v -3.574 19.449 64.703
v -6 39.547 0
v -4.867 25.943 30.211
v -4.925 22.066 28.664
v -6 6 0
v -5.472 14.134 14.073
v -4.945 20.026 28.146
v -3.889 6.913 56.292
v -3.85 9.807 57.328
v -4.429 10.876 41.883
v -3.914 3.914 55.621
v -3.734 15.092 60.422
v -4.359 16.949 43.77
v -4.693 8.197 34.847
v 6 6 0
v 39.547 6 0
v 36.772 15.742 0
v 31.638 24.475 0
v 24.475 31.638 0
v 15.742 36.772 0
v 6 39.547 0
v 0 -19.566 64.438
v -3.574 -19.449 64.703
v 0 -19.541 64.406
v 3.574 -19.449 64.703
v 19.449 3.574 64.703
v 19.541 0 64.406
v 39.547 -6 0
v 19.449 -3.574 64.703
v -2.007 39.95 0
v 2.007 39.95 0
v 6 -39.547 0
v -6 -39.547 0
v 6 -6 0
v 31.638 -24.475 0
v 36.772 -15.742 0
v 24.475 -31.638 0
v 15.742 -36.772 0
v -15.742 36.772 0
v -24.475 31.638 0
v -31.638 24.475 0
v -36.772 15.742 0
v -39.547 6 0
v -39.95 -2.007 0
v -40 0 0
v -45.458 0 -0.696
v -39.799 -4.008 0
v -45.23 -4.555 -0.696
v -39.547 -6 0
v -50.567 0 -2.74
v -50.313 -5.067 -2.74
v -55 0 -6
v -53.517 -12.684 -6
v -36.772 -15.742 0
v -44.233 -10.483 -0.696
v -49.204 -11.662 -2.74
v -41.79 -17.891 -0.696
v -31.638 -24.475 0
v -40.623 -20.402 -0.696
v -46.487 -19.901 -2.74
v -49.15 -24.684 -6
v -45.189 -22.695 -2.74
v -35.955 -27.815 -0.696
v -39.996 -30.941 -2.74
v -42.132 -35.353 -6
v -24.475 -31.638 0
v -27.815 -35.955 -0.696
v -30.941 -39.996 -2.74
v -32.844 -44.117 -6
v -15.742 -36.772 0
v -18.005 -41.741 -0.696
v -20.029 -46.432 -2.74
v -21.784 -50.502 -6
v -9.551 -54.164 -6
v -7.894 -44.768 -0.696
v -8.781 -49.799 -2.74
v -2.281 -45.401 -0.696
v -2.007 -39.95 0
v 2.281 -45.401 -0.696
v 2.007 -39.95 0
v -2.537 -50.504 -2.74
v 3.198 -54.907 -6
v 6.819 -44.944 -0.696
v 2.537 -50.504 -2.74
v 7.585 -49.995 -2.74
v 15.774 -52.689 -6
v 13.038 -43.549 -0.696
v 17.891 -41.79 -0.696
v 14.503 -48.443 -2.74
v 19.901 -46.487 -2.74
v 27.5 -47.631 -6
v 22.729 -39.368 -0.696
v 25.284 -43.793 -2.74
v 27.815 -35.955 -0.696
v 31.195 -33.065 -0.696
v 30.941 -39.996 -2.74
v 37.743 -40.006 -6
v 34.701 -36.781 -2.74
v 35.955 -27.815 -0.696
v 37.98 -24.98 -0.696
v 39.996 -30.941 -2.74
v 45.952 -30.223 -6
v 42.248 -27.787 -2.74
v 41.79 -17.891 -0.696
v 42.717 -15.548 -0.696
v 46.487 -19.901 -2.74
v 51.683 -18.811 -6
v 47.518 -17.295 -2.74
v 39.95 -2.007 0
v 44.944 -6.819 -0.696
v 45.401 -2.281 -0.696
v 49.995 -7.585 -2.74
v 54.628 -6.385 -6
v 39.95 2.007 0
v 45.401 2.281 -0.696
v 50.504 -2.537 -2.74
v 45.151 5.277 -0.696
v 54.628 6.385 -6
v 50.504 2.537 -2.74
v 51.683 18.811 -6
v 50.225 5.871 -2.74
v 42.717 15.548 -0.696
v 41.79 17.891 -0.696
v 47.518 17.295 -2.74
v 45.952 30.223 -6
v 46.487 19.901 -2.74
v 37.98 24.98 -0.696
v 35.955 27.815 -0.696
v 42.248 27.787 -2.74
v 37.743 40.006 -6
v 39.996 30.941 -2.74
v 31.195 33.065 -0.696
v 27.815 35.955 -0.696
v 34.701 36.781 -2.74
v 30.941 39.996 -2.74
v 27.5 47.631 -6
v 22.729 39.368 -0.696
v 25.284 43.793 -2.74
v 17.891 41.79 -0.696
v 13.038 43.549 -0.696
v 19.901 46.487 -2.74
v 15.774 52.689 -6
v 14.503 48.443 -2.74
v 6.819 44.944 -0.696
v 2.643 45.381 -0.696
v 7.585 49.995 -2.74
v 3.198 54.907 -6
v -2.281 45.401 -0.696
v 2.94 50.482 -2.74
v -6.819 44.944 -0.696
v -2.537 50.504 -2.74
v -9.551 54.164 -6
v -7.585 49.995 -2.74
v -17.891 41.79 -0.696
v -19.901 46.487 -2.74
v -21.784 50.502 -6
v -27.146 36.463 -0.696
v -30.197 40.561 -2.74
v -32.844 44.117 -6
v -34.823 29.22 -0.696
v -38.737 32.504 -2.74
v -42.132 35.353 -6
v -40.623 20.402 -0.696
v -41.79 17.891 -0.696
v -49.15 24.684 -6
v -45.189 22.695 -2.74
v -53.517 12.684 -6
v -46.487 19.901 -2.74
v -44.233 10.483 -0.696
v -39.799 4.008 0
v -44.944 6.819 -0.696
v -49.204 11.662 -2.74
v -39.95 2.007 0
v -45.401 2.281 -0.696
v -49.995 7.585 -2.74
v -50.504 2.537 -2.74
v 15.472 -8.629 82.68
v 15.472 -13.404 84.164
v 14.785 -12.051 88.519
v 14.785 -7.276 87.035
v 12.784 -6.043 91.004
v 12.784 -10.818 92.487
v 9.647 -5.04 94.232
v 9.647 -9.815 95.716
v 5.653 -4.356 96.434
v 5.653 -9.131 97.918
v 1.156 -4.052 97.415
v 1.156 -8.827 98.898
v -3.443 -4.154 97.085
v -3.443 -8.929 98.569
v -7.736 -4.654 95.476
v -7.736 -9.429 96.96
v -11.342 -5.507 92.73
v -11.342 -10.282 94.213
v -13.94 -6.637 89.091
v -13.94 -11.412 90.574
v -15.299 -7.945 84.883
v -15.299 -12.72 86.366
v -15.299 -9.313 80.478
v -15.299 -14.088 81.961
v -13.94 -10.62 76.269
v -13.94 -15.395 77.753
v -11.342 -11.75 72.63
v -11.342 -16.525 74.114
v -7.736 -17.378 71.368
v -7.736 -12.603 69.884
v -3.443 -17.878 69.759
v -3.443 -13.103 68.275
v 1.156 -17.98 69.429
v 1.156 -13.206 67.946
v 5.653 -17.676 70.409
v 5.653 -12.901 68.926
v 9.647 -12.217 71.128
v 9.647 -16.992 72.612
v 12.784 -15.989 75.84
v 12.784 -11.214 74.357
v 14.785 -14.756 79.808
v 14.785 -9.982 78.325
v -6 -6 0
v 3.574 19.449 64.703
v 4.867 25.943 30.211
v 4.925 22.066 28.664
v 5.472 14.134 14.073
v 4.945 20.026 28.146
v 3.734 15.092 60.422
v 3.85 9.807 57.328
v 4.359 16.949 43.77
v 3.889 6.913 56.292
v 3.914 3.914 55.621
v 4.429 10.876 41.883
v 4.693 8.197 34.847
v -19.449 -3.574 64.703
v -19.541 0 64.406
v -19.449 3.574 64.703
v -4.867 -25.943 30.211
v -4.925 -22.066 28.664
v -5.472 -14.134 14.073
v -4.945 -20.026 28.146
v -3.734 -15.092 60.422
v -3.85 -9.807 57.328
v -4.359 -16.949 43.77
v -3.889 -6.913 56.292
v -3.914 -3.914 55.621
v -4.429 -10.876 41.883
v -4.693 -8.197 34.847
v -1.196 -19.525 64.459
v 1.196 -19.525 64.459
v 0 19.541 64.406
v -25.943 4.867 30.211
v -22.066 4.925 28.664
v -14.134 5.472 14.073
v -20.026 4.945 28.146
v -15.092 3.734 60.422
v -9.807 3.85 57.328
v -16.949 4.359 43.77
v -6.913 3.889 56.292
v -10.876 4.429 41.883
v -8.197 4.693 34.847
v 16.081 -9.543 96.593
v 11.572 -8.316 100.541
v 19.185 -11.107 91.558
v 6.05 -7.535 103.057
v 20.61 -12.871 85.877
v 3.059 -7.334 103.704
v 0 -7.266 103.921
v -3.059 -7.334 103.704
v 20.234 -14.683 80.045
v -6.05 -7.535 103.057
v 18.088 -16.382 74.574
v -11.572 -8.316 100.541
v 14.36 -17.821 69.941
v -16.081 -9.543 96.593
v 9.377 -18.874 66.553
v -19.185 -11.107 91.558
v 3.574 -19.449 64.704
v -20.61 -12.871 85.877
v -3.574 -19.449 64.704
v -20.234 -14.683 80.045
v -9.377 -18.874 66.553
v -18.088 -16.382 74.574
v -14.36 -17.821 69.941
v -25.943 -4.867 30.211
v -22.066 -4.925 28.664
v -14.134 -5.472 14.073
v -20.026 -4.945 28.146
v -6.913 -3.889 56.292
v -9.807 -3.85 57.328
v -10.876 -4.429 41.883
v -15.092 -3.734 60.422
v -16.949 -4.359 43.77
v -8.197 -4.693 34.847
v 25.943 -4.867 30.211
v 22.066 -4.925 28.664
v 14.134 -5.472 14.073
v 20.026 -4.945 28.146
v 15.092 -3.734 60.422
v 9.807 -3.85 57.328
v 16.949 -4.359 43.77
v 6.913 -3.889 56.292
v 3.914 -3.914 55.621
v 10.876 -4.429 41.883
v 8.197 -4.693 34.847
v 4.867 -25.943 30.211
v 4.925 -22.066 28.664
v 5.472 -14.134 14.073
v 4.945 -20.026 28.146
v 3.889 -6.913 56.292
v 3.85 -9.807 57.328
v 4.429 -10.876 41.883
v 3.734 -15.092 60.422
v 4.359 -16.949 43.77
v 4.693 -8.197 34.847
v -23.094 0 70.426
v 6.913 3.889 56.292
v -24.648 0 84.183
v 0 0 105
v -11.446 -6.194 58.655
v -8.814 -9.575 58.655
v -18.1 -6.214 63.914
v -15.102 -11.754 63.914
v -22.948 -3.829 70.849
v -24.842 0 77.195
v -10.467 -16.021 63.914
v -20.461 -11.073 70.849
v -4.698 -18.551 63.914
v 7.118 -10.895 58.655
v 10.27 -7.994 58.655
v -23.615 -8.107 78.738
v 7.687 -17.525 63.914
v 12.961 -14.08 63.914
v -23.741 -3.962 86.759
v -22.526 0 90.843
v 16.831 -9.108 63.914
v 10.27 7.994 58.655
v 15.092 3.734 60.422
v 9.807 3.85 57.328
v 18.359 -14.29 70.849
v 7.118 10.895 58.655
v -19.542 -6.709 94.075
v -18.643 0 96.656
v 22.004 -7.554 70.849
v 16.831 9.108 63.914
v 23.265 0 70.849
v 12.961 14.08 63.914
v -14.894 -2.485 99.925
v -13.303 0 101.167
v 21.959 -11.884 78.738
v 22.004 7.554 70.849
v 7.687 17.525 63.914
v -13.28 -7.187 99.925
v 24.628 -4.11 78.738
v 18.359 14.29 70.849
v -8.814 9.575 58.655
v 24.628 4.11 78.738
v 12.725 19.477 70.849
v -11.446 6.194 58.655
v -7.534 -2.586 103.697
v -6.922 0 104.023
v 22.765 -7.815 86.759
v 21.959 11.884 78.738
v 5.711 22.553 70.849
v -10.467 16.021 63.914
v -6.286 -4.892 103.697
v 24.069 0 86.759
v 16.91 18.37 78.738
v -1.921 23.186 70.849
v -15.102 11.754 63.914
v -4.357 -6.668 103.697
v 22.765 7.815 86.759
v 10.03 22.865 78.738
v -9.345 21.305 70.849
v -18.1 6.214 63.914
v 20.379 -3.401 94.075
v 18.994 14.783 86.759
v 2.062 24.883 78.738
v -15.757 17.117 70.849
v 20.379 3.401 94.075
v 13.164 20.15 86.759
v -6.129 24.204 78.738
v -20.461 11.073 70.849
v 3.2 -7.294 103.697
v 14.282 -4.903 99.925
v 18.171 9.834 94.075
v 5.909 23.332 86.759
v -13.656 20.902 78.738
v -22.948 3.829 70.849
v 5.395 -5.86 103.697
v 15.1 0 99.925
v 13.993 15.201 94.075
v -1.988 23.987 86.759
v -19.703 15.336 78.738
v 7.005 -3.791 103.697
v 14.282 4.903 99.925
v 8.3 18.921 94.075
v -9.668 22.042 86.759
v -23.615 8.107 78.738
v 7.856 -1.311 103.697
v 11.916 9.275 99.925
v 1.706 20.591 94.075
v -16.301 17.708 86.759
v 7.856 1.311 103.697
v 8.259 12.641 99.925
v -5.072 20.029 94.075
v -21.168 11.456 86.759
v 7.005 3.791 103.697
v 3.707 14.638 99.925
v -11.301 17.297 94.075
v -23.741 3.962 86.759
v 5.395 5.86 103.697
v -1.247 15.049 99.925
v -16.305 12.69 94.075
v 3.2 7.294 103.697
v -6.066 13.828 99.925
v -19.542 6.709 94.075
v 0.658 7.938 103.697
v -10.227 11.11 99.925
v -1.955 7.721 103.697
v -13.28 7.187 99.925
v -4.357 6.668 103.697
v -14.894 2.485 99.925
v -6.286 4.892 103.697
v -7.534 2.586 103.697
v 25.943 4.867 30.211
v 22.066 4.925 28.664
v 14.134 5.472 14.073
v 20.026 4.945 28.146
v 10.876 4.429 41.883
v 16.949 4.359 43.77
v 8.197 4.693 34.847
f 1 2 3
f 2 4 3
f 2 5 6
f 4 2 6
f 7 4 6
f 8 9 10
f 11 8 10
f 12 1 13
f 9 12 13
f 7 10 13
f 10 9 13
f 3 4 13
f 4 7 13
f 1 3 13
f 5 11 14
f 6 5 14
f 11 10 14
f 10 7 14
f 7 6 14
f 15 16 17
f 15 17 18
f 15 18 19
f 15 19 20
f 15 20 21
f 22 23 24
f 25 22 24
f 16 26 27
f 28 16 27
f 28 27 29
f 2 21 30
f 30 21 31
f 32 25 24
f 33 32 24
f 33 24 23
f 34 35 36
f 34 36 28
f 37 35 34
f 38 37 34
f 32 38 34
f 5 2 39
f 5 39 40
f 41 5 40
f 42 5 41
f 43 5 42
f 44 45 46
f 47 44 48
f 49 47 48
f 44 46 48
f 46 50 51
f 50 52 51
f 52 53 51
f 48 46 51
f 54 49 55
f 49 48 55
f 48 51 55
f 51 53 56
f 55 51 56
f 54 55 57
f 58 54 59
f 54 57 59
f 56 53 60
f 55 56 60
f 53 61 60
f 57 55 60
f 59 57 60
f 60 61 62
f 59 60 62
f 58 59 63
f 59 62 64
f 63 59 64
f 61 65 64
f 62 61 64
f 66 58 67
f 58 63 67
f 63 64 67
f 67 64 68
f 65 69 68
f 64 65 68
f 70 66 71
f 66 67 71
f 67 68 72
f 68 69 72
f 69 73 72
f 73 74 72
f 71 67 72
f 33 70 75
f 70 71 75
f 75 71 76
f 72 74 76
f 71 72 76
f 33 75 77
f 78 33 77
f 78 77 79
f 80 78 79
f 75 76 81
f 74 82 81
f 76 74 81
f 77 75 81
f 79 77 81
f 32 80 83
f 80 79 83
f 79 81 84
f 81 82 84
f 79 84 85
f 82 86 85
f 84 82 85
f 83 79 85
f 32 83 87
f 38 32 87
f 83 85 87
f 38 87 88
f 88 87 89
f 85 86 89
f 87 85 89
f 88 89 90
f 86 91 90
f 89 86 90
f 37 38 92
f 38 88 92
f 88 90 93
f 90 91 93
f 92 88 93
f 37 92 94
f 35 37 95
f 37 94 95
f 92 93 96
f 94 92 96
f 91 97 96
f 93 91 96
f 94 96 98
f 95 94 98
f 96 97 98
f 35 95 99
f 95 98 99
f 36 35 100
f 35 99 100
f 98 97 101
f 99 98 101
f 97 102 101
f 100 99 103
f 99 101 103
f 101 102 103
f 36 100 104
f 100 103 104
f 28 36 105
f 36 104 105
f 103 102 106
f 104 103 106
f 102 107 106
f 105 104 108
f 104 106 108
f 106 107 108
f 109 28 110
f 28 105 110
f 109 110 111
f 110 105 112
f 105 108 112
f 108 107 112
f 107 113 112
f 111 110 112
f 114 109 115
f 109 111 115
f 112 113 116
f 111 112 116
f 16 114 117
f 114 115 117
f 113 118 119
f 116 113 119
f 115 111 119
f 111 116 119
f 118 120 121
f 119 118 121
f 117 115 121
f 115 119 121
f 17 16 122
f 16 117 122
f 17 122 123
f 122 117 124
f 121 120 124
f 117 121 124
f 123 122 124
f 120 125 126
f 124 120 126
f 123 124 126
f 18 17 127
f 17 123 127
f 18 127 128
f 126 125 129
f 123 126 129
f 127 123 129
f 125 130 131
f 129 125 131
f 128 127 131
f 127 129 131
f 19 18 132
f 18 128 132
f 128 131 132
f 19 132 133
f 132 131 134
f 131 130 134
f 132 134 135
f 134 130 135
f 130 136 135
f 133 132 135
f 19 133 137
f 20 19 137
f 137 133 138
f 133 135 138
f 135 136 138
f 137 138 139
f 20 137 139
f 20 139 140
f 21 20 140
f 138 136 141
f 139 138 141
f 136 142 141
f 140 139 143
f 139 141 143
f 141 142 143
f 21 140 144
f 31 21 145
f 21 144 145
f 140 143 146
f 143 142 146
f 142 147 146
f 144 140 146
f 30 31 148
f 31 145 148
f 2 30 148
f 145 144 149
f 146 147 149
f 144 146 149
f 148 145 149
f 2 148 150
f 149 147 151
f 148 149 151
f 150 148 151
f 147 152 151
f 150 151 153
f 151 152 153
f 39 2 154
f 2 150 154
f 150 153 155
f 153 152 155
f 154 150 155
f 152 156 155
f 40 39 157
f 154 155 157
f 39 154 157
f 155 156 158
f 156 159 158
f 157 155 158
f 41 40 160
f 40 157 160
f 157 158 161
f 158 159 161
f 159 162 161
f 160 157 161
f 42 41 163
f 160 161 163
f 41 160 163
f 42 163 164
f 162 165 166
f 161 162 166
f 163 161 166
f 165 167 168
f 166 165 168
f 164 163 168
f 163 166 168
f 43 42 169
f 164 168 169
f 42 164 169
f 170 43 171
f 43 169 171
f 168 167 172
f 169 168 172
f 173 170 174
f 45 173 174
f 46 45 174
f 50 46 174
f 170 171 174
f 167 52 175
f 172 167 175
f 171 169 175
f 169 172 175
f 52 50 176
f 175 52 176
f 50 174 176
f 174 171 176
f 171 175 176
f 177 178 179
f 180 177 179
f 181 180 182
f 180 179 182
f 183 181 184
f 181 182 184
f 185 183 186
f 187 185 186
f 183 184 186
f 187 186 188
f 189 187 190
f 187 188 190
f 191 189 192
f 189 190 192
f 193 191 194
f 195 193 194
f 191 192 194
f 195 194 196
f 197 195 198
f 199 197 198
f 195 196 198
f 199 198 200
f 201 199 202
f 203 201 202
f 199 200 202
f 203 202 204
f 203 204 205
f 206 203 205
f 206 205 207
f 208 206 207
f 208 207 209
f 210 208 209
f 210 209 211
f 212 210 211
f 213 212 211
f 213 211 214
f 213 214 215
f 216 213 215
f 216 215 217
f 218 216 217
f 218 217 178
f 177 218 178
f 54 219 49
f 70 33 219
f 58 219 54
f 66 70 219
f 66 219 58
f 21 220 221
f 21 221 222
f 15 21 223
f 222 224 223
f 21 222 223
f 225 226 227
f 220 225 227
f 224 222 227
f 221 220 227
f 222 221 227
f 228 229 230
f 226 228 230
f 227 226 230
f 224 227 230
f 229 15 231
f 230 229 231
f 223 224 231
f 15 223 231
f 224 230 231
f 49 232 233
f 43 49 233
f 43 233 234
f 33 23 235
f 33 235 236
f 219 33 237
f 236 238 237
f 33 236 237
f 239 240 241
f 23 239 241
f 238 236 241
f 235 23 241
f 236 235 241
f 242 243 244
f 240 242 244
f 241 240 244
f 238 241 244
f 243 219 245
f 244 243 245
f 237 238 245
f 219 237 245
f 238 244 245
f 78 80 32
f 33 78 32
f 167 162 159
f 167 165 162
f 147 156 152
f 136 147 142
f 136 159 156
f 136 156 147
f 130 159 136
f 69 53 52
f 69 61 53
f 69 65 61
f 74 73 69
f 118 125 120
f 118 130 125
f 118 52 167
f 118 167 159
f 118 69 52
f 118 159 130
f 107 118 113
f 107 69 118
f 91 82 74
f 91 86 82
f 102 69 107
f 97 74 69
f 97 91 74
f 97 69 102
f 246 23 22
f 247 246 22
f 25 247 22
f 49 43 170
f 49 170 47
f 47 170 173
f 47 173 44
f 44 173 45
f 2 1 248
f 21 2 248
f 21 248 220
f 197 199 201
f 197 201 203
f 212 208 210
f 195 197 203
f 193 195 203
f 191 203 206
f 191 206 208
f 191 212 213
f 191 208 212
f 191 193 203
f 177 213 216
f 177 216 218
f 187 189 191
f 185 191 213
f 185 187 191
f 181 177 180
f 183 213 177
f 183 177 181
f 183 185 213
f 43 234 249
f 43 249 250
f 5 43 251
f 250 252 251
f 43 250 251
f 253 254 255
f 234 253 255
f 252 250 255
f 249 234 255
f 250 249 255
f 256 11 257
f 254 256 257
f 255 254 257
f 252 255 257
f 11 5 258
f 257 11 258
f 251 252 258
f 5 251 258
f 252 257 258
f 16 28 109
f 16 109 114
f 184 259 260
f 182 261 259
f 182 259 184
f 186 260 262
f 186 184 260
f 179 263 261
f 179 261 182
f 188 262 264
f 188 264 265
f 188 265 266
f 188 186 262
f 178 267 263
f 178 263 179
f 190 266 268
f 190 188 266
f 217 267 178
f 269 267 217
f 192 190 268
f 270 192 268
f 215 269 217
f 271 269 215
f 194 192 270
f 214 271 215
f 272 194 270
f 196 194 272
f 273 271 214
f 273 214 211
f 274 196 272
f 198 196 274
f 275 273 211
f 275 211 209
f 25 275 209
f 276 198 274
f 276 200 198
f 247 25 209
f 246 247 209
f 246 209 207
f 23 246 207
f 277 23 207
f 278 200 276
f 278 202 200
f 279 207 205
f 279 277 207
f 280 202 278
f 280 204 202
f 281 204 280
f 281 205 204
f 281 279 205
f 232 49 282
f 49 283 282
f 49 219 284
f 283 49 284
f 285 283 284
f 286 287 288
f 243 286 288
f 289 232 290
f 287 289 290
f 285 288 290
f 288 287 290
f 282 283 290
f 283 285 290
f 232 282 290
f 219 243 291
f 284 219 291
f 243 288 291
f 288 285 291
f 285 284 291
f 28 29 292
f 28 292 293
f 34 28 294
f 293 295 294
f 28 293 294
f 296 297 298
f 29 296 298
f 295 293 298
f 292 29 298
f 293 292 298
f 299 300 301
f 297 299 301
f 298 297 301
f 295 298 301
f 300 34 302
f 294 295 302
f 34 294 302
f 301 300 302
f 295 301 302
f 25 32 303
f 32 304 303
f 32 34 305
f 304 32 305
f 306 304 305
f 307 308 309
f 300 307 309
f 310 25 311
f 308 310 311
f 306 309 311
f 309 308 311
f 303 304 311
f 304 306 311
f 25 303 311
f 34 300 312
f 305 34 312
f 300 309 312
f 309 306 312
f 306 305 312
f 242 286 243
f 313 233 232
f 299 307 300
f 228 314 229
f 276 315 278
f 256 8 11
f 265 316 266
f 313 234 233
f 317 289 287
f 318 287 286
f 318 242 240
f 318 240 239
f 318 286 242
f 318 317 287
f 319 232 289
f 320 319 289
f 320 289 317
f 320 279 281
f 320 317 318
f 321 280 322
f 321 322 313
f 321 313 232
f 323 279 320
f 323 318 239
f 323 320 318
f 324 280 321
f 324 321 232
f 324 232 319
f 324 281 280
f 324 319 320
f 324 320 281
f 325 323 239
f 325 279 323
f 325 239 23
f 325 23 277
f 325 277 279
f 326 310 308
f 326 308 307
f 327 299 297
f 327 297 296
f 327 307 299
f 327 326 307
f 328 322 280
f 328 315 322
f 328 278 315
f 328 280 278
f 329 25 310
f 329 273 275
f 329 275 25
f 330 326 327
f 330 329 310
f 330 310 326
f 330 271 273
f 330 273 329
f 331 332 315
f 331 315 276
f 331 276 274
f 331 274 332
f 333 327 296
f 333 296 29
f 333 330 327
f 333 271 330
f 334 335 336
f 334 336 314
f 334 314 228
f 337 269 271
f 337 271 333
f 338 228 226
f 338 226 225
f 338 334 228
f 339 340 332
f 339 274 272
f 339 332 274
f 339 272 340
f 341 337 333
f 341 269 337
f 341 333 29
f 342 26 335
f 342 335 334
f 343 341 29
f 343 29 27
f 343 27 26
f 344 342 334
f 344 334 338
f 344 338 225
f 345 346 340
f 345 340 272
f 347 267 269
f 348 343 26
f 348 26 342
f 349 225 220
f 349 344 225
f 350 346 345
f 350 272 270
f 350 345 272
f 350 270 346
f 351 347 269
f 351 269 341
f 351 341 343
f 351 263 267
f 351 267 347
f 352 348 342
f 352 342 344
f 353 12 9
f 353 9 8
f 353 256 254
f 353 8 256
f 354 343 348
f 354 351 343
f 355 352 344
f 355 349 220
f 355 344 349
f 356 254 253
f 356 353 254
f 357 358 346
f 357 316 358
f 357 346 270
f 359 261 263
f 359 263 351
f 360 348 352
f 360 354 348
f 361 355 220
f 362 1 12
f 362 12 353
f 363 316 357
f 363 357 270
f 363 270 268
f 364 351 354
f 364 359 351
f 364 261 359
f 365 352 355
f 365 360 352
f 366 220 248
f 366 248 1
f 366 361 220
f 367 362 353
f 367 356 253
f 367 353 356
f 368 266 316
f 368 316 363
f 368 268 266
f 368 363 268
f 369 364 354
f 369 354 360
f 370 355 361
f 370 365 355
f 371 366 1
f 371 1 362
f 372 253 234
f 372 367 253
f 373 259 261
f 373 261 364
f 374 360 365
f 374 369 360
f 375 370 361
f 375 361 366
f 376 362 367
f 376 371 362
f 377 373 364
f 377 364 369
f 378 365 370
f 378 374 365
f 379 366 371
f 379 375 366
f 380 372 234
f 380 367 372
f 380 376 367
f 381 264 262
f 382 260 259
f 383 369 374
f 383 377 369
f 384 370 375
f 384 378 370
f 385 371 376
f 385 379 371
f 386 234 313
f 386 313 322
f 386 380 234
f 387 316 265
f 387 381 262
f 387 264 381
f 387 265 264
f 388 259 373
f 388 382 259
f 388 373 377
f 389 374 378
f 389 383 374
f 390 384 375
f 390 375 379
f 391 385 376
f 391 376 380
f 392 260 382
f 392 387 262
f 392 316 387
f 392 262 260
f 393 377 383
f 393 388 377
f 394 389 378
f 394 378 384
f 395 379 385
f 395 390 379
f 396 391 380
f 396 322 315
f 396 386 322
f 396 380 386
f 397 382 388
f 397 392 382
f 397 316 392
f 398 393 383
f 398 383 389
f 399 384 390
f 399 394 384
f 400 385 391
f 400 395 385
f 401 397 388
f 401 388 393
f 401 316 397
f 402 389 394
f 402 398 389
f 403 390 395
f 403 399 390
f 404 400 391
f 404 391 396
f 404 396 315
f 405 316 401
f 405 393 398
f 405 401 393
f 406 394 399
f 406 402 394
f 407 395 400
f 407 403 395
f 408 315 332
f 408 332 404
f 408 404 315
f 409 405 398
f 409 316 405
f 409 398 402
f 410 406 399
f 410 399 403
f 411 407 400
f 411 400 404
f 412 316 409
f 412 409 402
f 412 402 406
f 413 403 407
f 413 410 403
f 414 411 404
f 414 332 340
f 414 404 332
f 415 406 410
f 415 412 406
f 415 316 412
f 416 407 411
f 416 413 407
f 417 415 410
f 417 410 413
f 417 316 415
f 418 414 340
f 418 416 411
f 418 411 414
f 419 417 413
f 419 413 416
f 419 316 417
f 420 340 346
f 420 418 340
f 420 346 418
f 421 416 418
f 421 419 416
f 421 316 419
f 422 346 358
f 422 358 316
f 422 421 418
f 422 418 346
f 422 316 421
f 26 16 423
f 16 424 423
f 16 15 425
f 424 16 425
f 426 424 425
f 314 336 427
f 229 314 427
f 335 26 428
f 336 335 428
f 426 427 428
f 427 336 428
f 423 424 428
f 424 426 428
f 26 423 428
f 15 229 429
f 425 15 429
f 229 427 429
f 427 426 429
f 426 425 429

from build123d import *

# Parameters (mm, degrees)
SKETCH004_R     = 22.270316
POCKET_DEPTH    = 45.906105
SKETCH005_R     = 15.471948
POCKET001_DEPTH = 5


with BuildPart() as part:
    # Sketch001 → Revolution (revolve)
    with BuildSketch(Plane.XZ):
        with BuildLine():
            Line((0, -6), (-40, -6))
            Line((-40, -6), (-55, -6))
            ThreePointArc((-40, 0), (-48.077747, -1.555632), (-55, -6))
            Line((-40, 0), (0, 0))
            Line((0, -6), (0, 0))
        make_face()
    revolve(axis=Axis((0, 0, 0), (0, 0, 1)))

    # Sketch003 (on Face2 of Revolution) → AdditiveLoft section 0
    with BuildSketch(Plane(origin=(0, 0, 0), x_dir=(-1, 0, 0), z_dir=(0, 0, 1))):
        Polygon((-6, 39.54744), (6, 39.54744), (6, 6), (39.54744, 6), (39.54744, -6), (6, -6), (6, -39.54744), (-6, -39.54744), (-6, -6), (-39.54744, -6), (-39.54744, 6), (-6, 6), align=None)
    # Sketch002 (on Face2 of Revolution) → AdditiveLoft section 1
    with BuildSketch(Plane(origin=(0, 0, 80), x_dir=(-1, 0, 0), z_dir=(0, 0, 1))):
        Polygon((-3, 14.696938), (3, 14.696938), (3, 3), (14.696938, 3), (14.696938, -3), (3, -3), (3, -14.696938), (-3, -14.696938), (-3, -3), (-14.696938, -3), (-14.696938, 3), (-3, 3), align=None)
    loft()

    # Sphere → Sphere (revolve)
    with BuildSketch(Plane(origin=(0, 0, 80), x_dir=(-1, 0, 0), z_dir=(0, 1, 0))):
        with BuildLine():
            ThreePointArc((0, -25), (25, 0), (0, 25))
            Line((0, 25), (0, -25))
        make_face()
    revolve(axis=Axis((0, 0, 80), (0, 0, 1)))

    # Sketch004 (on DatumPlane) → Pocket (cut, through all)
    with BuildSketch(Plane(origin=(0, -30.371881, 29.538427), x_dir=(-1, 0, 0), z_dir=(0, -0.954987, 0.296649))):
        with Locations((0, -58.80426)):
            Circle(SKETCH004_R)
    extrude(amount=POCKET_DEPTH, mode=Mode.SUBTRACT)

    # Sketch005 (on Face25 of Pocket) → Pocket001 (cut)
    with BuildSketch(Plane(origin=(0, -13.403601, 84.163578), x_dir=(1, 0, 0), z_dir=(0, -0.954987, 0.296649))):
        Circle(SKETCH005_R)
    extrude(amount=-POCKET001_DEPTH, mode=Mode.SUBTRACT)


solid = part.part
